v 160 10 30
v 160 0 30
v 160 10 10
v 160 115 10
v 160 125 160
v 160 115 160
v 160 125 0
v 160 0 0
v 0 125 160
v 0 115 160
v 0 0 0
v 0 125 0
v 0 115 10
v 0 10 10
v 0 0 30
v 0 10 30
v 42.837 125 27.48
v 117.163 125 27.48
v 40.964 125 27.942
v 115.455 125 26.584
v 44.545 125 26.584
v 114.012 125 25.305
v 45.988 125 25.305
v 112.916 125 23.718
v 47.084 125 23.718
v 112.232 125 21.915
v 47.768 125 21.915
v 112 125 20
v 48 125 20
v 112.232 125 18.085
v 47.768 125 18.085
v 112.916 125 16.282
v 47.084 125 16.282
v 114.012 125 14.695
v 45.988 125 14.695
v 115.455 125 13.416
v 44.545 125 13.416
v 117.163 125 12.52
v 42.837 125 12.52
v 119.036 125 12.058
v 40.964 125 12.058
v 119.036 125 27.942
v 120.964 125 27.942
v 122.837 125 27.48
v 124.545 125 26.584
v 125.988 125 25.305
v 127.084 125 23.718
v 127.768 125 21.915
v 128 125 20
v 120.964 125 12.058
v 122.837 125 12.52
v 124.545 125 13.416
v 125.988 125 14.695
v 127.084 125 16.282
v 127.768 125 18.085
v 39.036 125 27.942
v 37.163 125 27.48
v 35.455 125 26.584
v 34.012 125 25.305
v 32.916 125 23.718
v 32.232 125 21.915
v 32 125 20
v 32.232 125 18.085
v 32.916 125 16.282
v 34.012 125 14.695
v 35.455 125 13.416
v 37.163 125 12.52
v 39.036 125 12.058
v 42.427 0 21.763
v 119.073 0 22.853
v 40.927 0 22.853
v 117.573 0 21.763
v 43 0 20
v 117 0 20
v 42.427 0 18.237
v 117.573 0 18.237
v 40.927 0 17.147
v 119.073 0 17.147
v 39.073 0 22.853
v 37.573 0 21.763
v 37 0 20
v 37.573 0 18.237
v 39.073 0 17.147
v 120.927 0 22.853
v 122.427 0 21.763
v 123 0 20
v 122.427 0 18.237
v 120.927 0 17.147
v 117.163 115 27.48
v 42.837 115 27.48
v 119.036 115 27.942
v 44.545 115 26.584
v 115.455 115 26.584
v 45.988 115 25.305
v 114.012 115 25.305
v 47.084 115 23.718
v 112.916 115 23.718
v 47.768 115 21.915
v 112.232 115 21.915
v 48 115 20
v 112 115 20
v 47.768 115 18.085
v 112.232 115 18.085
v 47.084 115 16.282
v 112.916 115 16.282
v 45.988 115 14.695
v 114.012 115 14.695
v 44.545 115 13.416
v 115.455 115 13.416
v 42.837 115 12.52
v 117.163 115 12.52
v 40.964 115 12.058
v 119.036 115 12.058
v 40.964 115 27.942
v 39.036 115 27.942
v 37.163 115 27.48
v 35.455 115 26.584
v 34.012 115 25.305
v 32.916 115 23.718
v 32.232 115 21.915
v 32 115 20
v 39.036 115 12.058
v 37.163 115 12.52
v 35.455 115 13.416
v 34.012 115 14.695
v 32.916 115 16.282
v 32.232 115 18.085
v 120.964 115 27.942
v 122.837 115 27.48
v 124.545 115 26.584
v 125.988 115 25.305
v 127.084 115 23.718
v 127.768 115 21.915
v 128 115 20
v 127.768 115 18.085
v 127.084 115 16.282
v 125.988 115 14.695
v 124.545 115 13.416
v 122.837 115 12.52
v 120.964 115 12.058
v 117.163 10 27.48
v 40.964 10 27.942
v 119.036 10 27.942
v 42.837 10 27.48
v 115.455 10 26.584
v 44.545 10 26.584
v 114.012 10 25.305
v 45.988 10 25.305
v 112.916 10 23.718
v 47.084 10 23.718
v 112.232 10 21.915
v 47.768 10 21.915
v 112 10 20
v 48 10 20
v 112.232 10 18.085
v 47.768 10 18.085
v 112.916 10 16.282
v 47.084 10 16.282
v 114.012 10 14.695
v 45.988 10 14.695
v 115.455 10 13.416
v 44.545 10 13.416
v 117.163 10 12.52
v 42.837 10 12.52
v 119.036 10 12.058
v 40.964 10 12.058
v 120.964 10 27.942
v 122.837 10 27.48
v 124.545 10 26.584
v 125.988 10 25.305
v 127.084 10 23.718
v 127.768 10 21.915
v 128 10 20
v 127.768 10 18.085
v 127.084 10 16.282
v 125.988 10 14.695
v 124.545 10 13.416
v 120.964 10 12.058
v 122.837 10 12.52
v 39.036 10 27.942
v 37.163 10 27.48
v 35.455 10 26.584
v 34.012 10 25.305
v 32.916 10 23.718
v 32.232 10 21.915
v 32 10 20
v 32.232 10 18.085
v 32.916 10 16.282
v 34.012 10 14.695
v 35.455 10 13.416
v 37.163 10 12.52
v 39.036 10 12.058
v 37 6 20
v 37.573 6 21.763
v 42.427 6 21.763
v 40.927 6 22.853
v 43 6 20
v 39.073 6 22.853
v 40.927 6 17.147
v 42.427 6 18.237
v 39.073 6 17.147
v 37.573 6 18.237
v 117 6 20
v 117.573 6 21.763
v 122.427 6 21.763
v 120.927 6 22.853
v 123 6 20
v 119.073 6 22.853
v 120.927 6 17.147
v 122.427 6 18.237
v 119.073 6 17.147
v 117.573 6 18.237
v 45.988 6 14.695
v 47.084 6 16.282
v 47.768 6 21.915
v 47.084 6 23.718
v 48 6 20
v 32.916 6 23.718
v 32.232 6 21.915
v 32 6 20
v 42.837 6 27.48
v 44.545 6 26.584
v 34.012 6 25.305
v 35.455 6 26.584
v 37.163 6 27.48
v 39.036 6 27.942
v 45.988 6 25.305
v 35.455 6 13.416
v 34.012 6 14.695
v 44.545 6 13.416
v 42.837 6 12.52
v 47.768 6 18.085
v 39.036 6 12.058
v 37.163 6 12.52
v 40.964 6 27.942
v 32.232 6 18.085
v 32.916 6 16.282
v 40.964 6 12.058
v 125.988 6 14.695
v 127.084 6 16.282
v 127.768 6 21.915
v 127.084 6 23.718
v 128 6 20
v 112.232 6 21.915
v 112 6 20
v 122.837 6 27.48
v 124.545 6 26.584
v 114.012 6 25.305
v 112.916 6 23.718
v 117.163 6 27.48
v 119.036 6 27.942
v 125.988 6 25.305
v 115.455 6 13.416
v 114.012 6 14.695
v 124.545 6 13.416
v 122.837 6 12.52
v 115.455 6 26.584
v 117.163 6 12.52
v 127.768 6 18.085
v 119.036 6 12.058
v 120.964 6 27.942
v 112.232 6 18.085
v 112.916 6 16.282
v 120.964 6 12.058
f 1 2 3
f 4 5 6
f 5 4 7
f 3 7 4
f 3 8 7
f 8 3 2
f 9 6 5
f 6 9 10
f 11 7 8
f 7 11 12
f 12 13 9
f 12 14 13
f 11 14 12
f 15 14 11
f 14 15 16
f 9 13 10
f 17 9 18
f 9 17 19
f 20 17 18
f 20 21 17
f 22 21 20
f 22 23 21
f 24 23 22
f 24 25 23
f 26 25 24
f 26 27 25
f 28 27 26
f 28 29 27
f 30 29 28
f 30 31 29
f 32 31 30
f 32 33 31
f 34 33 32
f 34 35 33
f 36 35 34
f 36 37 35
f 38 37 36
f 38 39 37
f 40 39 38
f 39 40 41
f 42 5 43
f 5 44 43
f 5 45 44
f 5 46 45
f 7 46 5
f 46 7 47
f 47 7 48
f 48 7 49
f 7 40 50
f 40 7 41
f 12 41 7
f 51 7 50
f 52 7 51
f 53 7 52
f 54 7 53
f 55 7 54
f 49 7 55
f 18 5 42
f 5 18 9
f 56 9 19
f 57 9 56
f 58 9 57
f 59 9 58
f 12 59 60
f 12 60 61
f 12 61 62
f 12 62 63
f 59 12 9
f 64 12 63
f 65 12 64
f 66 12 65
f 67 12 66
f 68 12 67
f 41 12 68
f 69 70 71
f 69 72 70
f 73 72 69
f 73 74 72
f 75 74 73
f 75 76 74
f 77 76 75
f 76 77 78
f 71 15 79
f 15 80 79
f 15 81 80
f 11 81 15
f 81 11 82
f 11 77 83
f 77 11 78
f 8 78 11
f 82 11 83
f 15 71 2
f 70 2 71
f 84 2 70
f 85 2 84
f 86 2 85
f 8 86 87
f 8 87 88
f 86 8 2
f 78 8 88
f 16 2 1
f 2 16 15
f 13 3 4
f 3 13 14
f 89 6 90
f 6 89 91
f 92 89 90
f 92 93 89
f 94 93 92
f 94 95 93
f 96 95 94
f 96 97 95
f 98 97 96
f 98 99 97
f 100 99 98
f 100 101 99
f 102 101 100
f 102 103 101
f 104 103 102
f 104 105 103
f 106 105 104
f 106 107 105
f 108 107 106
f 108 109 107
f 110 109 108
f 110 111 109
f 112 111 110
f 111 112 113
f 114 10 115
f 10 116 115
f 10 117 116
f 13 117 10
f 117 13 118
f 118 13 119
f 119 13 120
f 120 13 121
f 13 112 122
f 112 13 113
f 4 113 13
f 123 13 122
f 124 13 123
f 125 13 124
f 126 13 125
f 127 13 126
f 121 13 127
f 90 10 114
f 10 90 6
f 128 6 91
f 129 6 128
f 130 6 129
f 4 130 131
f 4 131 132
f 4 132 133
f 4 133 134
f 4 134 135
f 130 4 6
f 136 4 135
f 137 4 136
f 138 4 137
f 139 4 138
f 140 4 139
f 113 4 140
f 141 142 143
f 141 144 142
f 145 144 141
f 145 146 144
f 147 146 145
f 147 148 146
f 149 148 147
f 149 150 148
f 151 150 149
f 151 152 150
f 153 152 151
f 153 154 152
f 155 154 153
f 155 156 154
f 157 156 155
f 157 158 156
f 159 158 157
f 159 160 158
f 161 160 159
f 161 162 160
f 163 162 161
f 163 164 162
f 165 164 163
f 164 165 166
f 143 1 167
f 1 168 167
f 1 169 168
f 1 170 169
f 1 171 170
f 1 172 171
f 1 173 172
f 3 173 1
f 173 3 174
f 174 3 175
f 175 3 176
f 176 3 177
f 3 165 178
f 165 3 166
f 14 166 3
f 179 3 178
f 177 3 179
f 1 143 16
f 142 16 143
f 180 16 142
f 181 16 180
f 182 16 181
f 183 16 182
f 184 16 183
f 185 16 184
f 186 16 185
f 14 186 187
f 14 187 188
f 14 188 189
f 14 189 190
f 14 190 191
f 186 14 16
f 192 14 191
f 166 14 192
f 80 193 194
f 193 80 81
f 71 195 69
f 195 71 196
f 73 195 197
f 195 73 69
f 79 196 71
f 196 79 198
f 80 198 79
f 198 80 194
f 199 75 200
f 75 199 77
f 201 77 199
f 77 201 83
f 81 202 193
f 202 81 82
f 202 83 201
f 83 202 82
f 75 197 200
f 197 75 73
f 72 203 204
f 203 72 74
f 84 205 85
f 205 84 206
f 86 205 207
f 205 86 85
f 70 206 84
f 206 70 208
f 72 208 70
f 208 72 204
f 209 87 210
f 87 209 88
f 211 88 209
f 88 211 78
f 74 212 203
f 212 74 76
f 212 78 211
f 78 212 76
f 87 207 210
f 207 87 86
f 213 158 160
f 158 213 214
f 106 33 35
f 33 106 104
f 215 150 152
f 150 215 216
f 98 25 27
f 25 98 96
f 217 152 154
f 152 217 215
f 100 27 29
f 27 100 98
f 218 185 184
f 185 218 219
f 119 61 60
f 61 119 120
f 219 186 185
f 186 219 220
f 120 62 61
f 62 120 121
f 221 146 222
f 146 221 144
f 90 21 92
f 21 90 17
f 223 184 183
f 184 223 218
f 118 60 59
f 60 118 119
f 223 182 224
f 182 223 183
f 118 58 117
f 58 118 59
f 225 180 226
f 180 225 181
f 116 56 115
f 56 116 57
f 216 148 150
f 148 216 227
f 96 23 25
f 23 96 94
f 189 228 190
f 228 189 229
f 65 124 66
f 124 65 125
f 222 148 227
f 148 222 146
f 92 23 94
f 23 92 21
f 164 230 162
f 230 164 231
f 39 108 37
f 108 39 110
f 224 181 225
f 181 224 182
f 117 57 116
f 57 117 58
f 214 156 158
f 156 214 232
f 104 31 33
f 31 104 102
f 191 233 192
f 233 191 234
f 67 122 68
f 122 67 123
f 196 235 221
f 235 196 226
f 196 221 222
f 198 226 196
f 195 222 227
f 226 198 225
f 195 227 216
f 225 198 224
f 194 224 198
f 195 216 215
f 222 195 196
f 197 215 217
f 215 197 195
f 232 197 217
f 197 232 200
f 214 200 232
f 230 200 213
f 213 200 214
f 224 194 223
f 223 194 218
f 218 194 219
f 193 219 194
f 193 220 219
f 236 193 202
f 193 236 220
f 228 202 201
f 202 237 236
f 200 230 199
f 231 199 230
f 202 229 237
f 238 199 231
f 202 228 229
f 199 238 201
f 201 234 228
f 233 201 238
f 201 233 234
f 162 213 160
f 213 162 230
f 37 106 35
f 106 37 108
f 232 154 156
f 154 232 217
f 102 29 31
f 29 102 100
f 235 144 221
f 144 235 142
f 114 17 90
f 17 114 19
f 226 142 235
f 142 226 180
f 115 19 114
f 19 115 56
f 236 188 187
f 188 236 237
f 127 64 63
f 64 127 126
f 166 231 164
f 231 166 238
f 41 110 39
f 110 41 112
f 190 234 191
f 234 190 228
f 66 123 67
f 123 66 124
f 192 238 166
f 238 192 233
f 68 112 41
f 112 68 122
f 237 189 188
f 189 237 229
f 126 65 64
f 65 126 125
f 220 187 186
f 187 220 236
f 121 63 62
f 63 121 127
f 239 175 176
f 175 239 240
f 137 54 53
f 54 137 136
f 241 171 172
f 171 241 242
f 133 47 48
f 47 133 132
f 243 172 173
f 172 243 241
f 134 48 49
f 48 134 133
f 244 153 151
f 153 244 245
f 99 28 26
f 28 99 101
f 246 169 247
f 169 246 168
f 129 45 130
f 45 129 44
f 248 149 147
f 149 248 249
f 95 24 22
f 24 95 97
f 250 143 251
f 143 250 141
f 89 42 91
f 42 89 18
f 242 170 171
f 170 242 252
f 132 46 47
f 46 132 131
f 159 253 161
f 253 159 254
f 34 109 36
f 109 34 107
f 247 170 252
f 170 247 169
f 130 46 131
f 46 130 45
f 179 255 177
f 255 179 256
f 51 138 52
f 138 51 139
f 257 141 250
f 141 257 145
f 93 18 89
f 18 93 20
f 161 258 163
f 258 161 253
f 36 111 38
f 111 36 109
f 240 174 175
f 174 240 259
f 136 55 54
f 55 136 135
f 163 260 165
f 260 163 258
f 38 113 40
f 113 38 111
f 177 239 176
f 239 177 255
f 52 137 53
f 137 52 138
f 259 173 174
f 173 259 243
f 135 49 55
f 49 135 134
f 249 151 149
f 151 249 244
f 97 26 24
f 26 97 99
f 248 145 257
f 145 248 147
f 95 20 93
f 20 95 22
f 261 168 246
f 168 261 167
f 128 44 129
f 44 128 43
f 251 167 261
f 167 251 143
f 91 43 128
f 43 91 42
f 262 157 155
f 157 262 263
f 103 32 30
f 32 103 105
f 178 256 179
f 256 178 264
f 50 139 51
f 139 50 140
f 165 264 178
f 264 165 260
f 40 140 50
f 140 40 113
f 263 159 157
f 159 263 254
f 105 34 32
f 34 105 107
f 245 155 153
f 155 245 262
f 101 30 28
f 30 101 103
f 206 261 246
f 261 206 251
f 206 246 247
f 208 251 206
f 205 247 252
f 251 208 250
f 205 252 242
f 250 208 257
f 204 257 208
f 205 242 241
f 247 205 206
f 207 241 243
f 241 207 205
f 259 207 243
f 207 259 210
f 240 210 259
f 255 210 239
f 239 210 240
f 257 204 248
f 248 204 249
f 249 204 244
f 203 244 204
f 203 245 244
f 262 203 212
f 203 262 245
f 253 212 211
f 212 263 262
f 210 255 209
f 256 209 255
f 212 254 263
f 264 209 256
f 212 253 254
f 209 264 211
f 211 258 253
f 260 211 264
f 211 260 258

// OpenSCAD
difference()
{
  cube([160,125,160]);
  translate([-5,-5,30]) cube([220,30,170]);
  translate([-5,10,10]) cube([220,105,170]);
  translate([40,15,20]) rotate([90,0,0]) cylinder(d=6,h=30);
  translate([120,15,20]) rotate([90,0,0]) cylinder(d=6,h=30);
  translate([40,136,20]) rotate([90,0,0]) cylinder(d=16,h=130);
  translate([120,136,20]) rotate([90,0,0]) cylinder(d=16,h=130);
}
